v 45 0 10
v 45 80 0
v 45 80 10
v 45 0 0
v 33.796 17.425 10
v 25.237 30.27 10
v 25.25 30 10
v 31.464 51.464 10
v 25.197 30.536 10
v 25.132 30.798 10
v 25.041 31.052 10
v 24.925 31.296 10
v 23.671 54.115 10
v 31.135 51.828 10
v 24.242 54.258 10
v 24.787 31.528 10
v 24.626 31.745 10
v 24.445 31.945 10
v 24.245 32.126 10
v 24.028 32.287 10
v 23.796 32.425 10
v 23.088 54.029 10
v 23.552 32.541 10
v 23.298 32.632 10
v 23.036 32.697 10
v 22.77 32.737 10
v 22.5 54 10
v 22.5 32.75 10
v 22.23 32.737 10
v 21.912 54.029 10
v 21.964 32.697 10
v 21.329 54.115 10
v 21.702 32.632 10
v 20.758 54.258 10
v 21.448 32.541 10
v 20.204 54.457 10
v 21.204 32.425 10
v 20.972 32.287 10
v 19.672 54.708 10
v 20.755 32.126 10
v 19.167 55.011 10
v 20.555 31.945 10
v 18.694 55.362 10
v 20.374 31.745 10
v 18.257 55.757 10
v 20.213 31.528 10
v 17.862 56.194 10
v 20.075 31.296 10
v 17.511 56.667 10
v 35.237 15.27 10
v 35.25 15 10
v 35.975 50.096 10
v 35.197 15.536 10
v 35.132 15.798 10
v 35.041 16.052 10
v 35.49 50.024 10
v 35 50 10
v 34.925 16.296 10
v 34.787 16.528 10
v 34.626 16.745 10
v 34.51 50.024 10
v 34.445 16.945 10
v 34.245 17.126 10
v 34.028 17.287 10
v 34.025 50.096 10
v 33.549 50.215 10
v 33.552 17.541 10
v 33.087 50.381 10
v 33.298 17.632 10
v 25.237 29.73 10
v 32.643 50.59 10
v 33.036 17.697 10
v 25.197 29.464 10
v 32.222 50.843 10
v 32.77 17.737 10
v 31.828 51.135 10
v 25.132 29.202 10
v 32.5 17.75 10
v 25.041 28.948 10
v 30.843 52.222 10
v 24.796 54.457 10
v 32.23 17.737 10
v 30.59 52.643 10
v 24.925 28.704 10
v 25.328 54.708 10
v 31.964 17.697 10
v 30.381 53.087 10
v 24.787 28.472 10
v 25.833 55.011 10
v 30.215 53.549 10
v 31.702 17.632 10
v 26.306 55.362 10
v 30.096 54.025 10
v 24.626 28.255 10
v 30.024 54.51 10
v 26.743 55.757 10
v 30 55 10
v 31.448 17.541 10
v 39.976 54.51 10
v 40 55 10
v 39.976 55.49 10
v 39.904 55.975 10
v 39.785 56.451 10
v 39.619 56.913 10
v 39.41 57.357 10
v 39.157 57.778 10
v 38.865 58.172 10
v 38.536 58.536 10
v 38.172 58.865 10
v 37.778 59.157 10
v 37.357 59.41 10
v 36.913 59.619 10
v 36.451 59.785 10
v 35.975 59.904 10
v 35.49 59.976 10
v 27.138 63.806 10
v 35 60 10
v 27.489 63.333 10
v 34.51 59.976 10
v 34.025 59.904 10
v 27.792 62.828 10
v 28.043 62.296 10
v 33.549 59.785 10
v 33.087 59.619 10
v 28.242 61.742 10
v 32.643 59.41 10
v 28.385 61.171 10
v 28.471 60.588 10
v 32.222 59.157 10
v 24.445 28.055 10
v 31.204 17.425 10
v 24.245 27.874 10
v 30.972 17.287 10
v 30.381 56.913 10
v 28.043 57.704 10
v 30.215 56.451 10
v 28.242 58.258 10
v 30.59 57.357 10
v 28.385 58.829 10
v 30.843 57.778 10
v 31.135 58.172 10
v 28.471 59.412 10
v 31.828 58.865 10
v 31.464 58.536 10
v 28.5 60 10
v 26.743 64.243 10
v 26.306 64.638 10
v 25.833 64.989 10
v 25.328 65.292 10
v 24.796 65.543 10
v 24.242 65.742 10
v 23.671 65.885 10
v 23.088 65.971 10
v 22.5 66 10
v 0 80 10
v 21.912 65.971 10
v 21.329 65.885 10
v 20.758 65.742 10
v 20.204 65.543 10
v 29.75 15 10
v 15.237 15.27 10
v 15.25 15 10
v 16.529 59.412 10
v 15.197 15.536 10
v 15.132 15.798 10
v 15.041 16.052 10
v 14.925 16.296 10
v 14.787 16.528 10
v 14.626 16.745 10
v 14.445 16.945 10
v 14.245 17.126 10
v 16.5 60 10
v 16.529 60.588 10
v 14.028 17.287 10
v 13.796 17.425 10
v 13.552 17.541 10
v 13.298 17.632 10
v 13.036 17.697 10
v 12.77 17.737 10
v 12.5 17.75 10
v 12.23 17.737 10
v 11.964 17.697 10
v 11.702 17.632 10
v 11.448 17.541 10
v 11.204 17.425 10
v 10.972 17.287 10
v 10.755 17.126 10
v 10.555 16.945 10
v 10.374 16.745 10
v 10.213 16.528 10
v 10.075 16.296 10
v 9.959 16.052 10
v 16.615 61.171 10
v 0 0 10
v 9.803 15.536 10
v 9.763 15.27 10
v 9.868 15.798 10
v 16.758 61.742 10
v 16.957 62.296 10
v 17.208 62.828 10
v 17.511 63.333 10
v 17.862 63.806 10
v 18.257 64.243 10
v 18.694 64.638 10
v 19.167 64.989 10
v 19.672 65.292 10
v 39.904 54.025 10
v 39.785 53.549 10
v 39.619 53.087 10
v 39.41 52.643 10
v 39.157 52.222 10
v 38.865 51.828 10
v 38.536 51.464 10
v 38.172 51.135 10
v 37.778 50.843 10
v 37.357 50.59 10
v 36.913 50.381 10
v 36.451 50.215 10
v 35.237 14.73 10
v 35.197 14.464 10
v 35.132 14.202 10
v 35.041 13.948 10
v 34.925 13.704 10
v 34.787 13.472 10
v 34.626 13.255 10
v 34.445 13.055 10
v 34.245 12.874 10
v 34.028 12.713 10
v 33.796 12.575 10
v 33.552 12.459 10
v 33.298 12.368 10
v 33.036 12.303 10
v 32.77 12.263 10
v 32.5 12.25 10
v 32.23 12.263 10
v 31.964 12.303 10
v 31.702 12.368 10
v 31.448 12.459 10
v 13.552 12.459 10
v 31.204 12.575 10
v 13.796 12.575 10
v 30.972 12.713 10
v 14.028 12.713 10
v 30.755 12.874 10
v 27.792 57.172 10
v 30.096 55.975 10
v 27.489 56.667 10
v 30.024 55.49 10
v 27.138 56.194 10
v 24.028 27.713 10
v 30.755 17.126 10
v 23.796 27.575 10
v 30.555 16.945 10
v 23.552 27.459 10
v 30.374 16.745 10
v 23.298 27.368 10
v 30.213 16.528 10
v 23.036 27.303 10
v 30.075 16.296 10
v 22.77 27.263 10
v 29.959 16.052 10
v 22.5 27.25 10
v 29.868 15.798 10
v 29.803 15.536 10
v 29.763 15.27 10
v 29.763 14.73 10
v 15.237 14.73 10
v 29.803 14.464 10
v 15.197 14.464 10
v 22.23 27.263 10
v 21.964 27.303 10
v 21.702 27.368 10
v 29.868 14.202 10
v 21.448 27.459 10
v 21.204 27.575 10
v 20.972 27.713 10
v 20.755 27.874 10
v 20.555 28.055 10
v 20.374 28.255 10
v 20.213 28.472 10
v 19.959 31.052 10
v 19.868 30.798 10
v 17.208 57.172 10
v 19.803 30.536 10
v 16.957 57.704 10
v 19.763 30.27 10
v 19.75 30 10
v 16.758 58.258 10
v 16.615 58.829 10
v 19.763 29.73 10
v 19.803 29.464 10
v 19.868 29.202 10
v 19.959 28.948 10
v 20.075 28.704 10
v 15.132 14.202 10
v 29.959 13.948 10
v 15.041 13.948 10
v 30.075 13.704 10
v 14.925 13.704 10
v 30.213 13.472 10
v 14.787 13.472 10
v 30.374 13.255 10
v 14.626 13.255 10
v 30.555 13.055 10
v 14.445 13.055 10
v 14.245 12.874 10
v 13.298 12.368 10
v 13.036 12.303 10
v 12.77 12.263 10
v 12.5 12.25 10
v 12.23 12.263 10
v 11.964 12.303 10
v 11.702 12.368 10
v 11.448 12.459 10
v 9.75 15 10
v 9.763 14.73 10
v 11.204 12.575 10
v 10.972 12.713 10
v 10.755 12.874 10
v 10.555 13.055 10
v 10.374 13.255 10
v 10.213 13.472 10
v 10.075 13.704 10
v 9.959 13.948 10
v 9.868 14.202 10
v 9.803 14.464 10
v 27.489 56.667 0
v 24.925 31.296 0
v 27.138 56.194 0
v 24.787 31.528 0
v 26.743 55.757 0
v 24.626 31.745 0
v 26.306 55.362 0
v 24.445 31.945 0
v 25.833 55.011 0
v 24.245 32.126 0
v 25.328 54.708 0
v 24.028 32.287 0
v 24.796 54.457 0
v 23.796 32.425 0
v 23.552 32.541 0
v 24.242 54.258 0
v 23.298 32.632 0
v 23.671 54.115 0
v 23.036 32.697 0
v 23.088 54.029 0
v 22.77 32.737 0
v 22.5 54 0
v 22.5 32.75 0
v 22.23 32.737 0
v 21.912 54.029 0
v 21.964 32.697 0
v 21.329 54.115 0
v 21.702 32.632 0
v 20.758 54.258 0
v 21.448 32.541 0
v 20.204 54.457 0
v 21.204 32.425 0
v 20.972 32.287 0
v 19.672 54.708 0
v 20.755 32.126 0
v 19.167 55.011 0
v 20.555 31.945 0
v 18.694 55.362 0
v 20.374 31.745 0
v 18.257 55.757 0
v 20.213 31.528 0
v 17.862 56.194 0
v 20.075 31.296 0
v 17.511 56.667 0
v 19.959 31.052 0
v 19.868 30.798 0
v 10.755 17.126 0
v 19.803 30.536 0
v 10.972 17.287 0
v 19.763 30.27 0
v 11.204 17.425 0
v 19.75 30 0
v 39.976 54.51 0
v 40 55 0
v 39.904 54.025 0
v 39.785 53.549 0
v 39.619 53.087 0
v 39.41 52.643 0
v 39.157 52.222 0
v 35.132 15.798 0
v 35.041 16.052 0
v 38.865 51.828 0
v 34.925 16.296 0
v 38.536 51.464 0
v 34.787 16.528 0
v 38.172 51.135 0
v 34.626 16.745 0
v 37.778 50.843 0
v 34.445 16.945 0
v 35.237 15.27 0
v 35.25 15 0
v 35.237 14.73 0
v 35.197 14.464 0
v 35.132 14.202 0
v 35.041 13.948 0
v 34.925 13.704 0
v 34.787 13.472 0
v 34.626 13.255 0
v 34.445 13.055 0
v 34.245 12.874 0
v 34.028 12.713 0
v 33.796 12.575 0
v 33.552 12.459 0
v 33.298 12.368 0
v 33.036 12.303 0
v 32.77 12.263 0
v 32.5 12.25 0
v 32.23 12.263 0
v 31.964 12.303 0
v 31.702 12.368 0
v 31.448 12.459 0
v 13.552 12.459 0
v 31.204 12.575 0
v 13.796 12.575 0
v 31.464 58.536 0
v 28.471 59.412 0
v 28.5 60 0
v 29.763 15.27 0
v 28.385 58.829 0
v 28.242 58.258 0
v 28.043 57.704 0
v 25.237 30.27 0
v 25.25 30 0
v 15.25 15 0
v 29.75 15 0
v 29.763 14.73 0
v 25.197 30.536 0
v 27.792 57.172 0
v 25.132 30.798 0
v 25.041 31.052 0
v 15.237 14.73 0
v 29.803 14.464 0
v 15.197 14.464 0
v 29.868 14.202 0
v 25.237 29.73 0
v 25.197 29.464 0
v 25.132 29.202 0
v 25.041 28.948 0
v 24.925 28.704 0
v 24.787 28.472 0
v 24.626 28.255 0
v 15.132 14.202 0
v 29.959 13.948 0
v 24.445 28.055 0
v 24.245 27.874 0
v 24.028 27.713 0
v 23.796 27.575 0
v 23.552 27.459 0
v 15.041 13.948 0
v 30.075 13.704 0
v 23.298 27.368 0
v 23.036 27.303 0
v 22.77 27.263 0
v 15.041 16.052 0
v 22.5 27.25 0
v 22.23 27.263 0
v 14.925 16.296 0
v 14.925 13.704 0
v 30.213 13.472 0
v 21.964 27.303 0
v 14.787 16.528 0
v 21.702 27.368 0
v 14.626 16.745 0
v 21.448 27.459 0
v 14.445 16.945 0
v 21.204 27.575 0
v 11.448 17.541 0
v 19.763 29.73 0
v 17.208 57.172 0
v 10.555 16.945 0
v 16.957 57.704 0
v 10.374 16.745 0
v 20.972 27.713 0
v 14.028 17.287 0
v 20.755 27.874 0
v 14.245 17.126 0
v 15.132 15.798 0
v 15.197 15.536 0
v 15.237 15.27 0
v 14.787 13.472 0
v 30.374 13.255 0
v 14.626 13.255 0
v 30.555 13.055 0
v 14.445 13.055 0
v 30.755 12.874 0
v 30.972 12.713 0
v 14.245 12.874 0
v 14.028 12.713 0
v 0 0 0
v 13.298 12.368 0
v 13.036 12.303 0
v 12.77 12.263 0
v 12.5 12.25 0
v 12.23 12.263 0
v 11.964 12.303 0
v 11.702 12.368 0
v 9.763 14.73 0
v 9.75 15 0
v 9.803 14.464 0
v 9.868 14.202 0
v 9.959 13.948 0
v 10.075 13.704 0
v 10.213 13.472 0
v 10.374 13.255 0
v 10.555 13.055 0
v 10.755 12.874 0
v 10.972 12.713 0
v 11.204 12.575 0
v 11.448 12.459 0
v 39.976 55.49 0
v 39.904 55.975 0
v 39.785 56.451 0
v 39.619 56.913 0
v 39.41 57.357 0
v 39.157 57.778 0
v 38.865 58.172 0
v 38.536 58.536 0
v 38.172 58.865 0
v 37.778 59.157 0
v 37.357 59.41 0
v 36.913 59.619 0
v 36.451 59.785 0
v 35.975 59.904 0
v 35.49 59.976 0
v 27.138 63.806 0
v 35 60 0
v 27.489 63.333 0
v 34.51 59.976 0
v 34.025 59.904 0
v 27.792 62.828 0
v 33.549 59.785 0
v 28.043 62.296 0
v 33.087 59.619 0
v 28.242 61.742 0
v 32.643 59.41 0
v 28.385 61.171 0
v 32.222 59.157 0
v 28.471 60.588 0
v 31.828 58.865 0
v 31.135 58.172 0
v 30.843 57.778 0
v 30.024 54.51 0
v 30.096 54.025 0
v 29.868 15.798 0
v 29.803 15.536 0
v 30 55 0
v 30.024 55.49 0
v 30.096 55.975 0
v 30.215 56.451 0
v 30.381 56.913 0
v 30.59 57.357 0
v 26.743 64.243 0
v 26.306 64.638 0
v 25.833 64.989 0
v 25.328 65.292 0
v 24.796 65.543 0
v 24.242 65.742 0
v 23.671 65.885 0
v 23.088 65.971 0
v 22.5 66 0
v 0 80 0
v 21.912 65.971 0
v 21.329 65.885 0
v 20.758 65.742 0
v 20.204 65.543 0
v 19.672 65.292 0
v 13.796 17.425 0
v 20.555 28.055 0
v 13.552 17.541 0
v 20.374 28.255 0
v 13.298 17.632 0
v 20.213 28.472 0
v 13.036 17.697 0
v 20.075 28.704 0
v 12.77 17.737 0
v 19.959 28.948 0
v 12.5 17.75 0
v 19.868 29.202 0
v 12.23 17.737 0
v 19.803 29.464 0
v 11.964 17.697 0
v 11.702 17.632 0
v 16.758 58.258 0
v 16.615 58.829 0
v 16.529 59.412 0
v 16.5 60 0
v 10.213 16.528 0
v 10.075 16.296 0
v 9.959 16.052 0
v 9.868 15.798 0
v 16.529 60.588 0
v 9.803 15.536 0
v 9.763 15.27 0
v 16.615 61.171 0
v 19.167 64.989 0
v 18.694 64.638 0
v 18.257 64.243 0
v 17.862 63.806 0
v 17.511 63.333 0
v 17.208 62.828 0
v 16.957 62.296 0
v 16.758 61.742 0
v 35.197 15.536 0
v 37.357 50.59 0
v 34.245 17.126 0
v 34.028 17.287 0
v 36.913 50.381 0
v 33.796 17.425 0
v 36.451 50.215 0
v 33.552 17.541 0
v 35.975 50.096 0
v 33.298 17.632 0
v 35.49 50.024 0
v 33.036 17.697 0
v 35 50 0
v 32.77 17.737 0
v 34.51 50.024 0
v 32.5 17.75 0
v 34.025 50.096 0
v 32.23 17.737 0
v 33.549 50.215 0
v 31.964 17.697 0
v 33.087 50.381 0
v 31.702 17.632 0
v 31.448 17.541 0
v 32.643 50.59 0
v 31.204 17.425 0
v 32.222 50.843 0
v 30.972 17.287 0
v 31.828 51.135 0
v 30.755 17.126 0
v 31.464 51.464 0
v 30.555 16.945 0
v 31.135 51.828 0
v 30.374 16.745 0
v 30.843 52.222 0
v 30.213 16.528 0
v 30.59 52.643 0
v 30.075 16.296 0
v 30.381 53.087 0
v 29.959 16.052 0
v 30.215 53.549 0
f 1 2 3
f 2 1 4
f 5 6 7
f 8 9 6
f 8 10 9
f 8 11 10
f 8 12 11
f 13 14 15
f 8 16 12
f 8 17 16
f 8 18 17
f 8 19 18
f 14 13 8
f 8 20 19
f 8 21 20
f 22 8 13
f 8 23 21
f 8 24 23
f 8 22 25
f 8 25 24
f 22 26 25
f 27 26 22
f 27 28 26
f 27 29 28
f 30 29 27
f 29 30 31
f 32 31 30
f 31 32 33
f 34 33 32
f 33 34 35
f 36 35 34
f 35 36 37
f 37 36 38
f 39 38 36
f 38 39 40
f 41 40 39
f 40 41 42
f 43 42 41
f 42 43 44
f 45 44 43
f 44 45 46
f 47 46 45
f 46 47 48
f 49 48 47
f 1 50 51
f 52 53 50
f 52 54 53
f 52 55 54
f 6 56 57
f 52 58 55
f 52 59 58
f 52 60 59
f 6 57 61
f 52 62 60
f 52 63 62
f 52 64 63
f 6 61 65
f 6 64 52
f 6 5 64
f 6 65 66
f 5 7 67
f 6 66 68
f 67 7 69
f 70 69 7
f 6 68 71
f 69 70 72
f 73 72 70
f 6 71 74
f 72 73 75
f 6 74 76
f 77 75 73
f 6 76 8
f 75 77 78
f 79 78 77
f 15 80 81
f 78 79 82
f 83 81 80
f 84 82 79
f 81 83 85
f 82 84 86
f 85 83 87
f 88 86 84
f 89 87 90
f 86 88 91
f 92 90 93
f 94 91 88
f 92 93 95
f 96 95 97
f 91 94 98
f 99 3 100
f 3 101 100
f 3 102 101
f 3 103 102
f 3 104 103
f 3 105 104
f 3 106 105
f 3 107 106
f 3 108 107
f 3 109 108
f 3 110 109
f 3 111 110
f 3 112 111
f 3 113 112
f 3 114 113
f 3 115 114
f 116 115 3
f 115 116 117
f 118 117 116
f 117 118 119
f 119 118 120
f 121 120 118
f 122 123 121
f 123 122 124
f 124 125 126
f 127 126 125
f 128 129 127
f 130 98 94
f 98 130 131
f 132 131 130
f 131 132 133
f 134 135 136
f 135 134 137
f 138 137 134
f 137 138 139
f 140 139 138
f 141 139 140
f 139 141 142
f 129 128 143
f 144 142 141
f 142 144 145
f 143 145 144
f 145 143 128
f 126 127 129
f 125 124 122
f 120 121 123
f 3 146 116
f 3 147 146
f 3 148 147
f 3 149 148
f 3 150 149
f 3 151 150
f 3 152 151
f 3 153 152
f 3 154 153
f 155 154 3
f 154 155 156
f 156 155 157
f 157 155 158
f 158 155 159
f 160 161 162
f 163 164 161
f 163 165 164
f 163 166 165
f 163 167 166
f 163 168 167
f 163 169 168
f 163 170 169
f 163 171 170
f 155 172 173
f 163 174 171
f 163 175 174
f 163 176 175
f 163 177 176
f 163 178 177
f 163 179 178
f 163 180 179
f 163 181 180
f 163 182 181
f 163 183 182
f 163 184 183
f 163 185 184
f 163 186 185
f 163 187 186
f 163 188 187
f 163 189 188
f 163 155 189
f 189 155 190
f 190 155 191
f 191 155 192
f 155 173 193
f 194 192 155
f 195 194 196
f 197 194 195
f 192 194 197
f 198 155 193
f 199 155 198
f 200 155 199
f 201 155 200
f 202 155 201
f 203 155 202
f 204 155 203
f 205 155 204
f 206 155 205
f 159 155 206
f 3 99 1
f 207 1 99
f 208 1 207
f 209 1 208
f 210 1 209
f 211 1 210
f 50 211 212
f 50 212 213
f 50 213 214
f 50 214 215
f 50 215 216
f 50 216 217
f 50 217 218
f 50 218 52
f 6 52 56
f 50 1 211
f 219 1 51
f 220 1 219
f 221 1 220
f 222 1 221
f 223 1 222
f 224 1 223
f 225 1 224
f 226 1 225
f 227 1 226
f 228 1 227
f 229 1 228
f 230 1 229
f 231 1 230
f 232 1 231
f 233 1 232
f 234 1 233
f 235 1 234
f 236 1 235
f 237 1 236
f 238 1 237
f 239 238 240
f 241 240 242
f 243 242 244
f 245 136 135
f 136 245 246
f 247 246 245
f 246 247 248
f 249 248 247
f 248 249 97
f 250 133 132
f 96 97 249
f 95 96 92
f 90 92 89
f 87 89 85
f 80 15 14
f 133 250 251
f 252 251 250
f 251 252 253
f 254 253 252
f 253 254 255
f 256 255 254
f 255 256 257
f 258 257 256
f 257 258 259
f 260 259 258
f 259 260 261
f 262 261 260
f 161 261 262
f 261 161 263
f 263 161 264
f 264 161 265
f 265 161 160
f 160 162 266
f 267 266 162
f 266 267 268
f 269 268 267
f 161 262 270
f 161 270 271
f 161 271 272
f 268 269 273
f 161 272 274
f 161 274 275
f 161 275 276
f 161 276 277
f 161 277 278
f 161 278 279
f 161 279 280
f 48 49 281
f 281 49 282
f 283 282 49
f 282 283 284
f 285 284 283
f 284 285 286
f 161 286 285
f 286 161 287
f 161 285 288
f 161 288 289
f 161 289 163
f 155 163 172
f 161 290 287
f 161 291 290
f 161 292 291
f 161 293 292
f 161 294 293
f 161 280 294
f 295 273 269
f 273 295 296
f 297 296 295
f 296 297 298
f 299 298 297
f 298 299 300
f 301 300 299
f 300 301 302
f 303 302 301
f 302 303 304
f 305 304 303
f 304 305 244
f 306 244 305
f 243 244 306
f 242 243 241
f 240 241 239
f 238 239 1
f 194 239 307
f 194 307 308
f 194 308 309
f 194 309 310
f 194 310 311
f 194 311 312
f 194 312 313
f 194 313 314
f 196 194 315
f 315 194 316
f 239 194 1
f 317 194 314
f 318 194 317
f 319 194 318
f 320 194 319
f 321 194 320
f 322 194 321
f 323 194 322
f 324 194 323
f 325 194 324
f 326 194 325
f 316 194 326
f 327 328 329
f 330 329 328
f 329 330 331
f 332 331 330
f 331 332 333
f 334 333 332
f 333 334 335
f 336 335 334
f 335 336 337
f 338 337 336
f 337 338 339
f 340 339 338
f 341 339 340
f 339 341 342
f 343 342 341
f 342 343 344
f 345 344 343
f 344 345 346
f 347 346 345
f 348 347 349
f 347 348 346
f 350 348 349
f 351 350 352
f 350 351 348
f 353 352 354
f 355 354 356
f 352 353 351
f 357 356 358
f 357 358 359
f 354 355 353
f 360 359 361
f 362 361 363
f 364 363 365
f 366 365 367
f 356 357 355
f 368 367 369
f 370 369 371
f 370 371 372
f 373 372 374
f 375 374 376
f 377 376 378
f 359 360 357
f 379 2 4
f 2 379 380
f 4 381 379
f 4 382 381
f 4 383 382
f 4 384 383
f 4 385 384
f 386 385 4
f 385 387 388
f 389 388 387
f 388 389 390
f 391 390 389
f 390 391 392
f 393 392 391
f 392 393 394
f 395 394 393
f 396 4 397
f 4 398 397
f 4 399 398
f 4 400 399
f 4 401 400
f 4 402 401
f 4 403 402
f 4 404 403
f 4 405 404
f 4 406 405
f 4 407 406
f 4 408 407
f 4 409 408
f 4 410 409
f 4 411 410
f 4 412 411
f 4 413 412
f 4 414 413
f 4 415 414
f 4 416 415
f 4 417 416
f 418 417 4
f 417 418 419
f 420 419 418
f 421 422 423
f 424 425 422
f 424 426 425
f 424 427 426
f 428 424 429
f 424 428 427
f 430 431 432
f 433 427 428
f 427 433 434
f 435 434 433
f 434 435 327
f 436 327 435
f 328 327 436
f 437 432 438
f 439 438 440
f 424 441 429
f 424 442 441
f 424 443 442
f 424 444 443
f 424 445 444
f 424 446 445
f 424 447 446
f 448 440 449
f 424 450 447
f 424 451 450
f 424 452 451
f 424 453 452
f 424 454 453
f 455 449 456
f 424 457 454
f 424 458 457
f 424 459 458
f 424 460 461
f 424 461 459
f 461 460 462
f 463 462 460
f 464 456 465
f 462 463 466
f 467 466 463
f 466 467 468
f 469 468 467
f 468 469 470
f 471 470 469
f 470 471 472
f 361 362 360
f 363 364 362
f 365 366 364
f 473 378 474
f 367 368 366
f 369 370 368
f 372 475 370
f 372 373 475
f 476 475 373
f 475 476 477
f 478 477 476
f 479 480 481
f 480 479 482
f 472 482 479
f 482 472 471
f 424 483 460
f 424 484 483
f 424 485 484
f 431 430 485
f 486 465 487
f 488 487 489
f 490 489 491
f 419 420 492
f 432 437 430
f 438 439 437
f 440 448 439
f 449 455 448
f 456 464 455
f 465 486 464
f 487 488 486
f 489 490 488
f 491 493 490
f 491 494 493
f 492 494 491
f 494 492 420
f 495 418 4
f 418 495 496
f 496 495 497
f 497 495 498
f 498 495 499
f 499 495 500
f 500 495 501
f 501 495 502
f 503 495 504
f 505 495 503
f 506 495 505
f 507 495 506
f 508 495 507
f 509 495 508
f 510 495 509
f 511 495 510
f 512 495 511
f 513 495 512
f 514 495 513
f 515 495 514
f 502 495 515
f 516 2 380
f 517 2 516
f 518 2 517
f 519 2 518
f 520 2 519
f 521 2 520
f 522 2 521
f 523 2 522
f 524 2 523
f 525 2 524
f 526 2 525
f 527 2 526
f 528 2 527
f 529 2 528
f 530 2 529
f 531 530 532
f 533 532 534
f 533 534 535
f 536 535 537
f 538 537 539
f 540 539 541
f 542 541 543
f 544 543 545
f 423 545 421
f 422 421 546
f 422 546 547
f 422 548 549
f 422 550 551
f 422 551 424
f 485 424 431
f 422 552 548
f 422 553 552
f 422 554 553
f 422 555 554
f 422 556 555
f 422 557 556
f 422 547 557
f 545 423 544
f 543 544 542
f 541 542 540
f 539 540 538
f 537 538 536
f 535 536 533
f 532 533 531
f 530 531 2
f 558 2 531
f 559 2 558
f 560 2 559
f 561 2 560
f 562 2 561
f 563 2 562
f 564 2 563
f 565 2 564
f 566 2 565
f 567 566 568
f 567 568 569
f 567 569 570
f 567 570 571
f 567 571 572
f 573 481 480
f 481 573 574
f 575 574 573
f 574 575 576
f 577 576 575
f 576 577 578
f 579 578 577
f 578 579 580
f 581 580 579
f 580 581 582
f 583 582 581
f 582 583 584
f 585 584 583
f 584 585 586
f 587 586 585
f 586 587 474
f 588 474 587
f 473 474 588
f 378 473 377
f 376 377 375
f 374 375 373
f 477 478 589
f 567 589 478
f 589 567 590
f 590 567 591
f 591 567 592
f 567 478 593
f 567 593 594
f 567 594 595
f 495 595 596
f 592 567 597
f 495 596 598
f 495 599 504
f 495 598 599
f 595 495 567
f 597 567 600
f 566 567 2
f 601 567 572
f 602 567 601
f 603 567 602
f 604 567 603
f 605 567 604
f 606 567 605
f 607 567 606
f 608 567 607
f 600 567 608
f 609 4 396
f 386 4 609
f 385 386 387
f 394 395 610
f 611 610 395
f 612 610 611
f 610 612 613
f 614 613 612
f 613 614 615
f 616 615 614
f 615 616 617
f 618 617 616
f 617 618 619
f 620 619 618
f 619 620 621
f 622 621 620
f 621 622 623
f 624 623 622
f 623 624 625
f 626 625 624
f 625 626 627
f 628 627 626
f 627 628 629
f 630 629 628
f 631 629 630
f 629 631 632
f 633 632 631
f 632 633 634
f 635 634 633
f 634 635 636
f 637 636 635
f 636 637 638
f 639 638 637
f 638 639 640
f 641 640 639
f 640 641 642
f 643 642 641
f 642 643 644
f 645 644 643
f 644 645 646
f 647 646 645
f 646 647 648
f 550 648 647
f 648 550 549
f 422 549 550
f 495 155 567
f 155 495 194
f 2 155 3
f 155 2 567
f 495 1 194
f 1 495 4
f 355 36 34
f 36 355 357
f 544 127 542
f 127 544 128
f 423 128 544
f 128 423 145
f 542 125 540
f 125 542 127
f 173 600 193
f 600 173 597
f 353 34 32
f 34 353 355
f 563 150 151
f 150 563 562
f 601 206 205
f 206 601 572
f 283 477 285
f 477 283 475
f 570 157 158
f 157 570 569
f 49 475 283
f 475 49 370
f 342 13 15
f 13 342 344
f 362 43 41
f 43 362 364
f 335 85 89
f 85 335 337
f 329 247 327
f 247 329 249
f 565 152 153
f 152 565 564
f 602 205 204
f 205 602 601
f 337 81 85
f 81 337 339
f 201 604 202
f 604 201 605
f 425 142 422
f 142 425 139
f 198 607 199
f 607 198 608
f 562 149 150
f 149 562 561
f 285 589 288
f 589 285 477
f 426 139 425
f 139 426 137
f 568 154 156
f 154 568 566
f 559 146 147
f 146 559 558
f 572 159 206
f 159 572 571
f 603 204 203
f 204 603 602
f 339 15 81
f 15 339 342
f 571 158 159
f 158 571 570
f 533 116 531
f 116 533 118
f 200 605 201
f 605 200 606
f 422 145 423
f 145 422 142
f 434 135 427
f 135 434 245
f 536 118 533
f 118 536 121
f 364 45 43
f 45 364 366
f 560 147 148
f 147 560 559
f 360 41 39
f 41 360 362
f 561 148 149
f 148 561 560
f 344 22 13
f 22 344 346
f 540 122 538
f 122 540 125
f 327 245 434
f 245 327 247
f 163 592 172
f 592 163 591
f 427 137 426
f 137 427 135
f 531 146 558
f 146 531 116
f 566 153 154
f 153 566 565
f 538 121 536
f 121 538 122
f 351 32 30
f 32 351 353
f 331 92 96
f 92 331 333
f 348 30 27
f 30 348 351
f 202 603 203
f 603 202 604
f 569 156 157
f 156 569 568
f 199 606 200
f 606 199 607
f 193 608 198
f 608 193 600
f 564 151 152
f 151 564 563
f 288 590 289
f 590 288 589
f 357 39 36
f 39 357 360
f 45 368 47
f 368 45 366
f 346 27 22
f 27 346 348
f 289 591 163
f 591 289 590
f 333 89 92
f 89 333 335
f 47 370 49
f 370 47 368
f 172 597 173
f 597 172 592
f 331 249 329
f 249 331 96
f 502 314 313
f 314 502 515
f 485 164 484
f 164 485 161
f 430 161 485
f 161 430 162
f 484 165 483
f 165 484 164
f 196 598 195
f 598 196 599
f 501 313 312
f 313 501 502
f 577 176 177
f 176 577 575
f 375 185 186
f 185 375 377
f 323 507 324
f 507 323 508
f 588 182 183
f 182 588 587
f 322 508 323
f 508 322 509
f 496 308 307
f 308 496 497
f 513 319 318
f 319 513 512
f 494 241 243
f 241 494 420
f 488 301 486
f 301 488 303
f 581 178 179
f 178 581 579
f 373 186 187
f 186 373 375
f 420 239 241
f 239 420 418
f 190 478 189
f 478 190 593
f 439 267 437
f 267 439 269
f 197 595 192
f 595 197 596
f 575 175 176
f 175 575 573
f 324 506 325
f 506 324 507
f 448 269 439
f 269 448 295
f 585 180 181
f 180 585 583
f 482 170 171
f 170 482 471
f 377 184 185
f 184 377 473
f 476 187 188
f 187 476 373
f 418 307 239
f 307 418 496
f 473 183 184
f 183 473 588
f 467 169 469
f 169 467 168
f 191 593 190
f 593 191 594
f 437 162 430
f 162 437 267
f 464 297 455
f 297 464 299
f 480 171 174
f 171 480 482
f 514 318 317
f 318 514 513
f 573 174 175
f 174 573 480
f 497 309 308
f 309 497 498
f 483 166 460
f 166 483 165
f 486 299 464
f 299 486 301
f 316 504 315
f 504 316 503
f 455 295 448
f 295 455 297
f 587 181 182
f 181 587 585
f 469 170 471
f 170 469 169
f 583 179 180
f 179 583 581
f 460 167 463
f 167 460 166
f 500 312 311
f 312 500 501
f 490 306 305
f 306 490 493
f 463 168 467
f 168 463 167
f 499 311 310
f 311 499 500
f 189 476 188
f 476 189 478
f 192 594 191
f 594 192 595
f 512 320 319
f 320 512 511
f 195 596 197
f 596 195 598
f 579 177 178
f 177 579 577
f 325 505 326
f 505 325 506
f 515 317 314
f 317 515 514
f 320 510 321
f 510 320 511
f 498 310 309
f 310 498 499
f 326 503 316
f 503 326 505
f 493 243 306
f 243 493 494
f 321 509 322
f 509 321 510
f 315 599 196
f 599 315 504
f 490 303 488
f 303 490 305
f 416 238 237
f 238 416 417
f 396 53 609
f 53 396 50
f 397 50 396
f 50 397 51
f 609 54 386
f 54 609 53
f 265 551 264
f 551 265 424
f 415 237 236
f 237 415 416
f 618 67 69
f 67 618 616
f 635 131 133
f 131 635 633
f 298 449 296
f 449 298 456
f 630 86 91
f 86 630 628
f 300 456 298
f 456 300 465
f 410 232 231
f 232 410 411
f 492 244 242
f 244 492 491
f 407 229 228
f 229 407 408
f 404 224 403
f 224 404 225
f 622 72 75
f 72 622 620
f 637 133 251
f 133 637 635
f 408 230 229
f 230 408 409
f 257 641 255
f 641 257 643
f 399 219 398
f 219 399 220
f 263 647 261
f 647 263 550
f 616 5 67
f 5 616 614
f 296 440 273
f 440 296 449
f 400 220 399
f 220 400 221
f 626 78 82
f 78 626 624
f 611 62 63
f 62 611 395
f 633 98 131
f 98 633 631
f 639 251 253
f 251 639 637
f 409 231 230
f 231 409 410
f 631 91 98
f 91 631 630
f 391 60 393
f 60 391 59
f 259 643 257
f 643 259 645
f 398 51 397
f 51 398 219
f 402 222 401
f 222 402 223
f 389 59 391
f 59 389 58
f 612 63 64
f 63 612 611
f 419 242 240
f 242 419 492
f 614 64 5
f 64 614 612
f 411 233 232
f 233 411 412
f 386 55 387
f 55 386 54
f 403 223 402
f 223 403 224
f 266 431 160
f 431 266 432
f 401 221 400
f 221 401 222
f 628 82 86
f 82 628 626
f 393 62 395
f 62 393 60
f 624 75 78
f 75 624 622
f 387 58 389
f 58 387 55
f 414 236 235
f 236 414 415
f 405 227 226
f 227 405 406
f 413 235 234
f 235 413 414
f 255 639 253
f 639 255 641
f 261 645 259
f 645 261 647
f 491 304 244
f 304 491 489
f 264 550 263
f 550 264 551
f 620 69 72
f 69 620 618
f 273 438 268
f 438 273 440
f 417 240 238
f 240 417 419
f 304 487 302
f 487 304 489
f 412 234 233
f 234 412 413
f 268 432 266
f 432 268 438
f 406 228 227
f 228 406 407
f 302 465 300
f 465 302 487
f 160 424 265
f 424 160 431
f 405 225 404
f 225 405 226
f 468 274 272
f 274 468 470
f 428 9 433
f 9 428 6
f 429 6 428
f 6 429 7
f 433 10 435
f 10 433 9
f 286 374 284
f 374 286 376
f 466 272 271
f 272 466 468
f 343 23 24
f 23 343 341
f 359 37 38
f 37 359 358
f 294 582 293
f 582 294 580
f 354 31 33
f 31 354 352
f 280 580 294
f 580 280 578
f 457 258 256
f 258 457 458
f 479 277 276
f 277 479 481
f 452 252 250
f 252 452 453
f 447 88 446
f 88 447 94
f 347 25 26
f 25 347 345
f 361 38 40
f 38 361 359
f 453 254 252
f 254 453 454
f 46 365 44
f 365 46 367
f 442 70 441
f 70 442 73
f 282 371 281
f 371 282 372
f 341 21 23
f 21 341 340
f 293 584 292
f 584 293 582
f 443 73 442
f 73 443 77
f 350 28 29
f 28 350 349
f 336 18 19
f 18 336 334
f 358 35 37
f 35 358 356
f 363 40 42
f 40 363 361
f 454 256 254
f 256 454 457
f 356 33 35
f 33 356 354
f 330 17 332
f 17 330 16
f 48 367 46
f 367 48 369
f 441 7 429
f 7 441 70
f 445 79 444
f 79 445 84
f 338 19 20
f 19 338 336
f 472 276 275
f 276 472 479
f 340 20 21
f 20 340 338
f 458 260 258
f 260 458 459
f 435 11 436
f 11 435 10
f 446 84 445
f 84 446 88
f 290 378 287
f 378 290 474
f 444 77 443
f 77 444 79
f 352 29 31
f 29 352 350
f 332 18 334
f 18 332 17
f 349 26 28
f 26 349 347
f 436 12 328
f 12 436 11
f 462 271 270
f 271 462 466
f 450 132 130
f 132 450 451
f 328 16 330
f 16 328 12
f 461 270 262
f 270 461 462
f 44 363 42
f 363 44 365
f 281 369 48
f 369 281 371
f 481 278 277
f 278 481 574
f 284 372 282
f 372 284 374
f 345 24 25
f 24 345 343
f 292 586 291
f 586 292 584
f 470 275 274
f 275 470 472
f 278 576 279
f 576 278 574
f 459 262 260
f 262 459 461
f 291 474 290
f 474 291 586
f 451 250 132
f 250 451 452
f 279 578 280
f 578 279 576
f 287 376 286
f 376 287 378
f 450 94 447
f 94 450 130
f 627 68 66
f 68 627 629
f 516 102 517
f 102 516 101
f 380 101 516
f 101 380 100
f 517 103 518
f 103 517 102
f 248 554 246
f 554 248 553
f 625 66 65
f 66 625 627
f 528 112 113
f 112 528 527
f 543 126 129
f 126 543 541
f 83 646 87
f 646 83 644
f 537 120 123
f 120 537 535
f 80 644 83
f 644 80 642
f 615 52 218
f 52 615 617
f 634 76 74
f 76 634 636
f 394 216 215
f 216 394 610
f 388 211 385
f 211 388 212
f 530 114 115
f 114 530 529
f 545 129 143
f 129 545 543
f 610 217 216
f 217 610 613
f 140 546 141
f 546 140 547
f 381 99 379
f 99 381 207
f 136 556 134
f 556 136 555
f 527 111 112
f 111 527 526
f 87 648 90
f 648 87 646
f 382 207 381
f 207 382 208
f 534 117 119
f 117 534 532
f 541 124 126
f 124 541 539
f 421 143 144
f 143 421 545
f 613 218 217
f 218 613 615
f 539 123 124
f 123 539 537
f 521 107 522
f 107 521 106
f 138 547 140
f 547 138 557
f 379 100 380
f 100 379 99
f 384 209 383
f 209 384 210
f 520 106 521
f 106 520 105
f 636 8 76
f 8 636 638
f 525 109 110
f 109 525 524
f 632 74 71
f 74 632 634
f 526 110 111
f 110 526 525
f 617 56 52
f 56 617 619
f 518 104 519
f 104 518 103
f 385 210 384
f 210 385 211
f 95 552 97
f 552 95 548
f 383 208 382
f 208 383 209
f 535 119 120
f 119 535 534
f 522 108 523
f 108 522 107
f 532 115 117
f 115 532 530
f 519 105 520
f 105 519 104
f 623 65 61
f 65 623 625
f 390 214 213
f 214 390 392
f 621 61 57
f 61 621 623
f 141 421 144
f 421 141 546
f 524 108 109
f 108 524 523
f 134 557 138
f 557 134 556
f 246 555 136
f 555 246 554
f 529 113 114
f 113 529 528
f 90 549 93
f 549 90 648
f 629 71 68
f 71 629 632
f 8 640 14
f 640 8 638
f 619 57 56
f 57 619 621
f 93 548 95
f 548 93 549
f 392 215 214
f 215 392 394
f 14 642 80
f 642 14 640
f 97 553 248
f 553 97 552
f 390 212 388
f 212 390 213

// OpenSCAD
// file: ../../config.scad
// Ebike Configuration
// All dimensions in mm

// =============================================================================
// RIDER PARAMETERS
// =============================================================================
rider_height = 173;
rider_weight = 55;

// =============================================================================
// FRAME GEOMETRY
// =============================================================================
frame_size = 520;                    // Seat tube center-to-top
top_tube_effective = 545;
head_tube_length = 140;
head_tube_angle = 70;
seat_tube_angle = 72;
chainstay_length = 460;
bb_drop = 65;
wheelbase = 1080;
standover_height = 450;              // Step-through
stack = 620;
reach = 370;

// =============================================================================
// TUBE DIAMETERS
// =============================================================================
head_tube_id = 44;                   // 1-1/8" straight steerer
head_tube_od = 49;
seat_tube_id = 27.2;                 // Standard seatpost
down_tube_od = 44;
top_tube_od = 32;
seat_stay_od = 16;
chainstay_od = 22;

// =============================================================================
// MOTOR CONFIGURATION
// =============================================================================
motor_type = "mid-drive";
bb_shell_width = 68;                 // BSA standard
bb_clearance_width = 120;

// =============================================================================
// DROPOUT PARAMETERS
// =============================================================================
dropout_material = "6061-T6";
dropout_thickness = 10;
dropout_width = 45;
dropout_height = 80;
dropout_axle_spacing = 142;          // Boost thru-axle
dropout_axle_diameter = 12;

// =============================================================================
// BOTTOM BRACKET SHELL
// =============================================================================
bb_shell_od = 42;
bb_shell_id = 34.8;                  // BSA threaded
bb_thread_tpi = 24;                  // BSA 1.37" x 24 TPI

// =============================================================================
// HEAD TUBE
// =============================================================================
// Uses head_tube_length, head_tube_id, head_tube_od from above

// =============================================================================
// SEAT COLLAR
// =============================================================================
seat_collar_id = 31.8;               // For 27.2mm post with shim
seat_collar_od = 38;
seat_collar_height = 25;

// =============================================================================
// MOTOR MOUNT
// =============================================================================
motor_mount_thickness = 8;
motor_mount_width = 120;
motor_mount_height = 100;

// =============================================================================
// BATTERY MOUNT
// =============================================================================
battery_mount_thickness = 6;
battery_mount_width = 60;
battery_mount_height = 40;
battery_mount_quantity = 4;

// =============================================================================
// BRAKE MOUNT (Post Mount)
// =============================================================================
brake_mount_thickness = 10;
brake_mount_width = 80;
brake_mount_height = 50;
brake_post_bolt_spacing = 74;        // Post mount standard
brake_rotor_size_front = 180;
brake_rotor_size_rear = 160;

// =============================================================================
// CABLE GUIDES
// =============================================================================
cable_guide_length = 25;
cable_guide_width = 15;
cable_guide_height = 8;
cable_guide_quantity = 6;

// =============================================================================
// HEADSET CUPS
// =============================================================================
headset_cup_od = 44;
headset_bearing_seat = 30;

// =============================================================================
// RACK/FENDER MOUNTS
// =============================================================================
rack_mount_length = 30;
rack_mount_width = 20;
rack_mount_height = 10;
rack_mount_thread = 5;               // M5
rack_mount_quantity = 4;

// =============================================================================
// GUSSET PLATES
// =============================================================================
gusset_thickness = 6;
gusset_width = 80;
gusset_height = 60;
gusset_quantity = 2;

// =============================================================================
// COMPOSITE FRAME TUBES (FibreSeeker 3)
// =============================================================================
// Wall thickness for carbon fiber reinforced tubes
tube_wall_thickness = 3;

// Down tube (curved for step-through)
down_tube_length = 650;              // Along curve
down_tube_curve_radius = 800;        // Radius of curve

// Seat tube
seat_tube_length = 520;              // frame_size
seat_tube_od = 34;                   // Outer diameter

// Chainstays
chainstay_wall = 2.5;

// Seat stays
seat_stay_length = 480;
seat_stay_wall = 2;

// =============================================================================
// TUBE SECTIONING (for build volume constraints)
// =============================================================================
// Joint design: internal aluminum sleeve with M6 through-bolts
joint_overlap = 30;                  // Overlap length per joint
joint_bolt_diameter = 6;             // M6 bolts
joint_bolt_count = 2;                // Bolts per joint

// Section counts
down_tube_sections = 3;
seat_tube_sections = 2;
chainstay_sections = 2;
seat_stay_sections = 2;

// Sleeve parameters (CNC milled aluminum)
sleeve_wall_thickness = 2;
sleeve_length = 60;                  // Total sleeve length (2x overlap)

// =============================================================================
// MANUFACTURING TOLERANCES
// =============================================================================
tolerance_press_fit = 0.05;
tolerance_general = 0.1;

// =============================================================================
// COMMON CONSTANTS
// =============================================================================
$fn = 64;                            // Circle resolution
epsilon = 0.01;                      // For boolean operations
// main file
// Rear Dropout
// CNC milled component for NestWorks C500

include <../../config.scad>

module dropout() {
    difference() {
        // Main body
        cube([dropout_width, dropout_height, dropout_thickness]);

        // Axle hole
        translate([dropout_width/2, dropout_height - 20, -epsilon])
            cylinder(h = dropout_thickness + 2*epsilon, d = dropout_axle_diameter);

        // Chainstay mounting holes (2x M5)
        translate([dropout_width/2 - 10, 15, -epsilon])
            cylinder(h = dropout_thickness + 2*epsilon, d = 5.5);
        translate([dropout_width/2 + 10, 15, -epsilon])
            cylinder(h = dropout_thickness + 2*epsilon, d = 5.5);

        // Seat stay mounting hole (M5)
        translate([dropout_width/2, dropout_height - 50, -epsilon])
            cylinder(h = dropout_thickness + 2*epsilon, d = 5.5);

        // Derailleur hanger mount (M10)
        translate([dropout_width - 10, dropout_height - 25, -epsilon])
            cylinder(h = dropout_thickness + 2*epsilon, d = 10);
    }
}

// Render for preview
dropout();
